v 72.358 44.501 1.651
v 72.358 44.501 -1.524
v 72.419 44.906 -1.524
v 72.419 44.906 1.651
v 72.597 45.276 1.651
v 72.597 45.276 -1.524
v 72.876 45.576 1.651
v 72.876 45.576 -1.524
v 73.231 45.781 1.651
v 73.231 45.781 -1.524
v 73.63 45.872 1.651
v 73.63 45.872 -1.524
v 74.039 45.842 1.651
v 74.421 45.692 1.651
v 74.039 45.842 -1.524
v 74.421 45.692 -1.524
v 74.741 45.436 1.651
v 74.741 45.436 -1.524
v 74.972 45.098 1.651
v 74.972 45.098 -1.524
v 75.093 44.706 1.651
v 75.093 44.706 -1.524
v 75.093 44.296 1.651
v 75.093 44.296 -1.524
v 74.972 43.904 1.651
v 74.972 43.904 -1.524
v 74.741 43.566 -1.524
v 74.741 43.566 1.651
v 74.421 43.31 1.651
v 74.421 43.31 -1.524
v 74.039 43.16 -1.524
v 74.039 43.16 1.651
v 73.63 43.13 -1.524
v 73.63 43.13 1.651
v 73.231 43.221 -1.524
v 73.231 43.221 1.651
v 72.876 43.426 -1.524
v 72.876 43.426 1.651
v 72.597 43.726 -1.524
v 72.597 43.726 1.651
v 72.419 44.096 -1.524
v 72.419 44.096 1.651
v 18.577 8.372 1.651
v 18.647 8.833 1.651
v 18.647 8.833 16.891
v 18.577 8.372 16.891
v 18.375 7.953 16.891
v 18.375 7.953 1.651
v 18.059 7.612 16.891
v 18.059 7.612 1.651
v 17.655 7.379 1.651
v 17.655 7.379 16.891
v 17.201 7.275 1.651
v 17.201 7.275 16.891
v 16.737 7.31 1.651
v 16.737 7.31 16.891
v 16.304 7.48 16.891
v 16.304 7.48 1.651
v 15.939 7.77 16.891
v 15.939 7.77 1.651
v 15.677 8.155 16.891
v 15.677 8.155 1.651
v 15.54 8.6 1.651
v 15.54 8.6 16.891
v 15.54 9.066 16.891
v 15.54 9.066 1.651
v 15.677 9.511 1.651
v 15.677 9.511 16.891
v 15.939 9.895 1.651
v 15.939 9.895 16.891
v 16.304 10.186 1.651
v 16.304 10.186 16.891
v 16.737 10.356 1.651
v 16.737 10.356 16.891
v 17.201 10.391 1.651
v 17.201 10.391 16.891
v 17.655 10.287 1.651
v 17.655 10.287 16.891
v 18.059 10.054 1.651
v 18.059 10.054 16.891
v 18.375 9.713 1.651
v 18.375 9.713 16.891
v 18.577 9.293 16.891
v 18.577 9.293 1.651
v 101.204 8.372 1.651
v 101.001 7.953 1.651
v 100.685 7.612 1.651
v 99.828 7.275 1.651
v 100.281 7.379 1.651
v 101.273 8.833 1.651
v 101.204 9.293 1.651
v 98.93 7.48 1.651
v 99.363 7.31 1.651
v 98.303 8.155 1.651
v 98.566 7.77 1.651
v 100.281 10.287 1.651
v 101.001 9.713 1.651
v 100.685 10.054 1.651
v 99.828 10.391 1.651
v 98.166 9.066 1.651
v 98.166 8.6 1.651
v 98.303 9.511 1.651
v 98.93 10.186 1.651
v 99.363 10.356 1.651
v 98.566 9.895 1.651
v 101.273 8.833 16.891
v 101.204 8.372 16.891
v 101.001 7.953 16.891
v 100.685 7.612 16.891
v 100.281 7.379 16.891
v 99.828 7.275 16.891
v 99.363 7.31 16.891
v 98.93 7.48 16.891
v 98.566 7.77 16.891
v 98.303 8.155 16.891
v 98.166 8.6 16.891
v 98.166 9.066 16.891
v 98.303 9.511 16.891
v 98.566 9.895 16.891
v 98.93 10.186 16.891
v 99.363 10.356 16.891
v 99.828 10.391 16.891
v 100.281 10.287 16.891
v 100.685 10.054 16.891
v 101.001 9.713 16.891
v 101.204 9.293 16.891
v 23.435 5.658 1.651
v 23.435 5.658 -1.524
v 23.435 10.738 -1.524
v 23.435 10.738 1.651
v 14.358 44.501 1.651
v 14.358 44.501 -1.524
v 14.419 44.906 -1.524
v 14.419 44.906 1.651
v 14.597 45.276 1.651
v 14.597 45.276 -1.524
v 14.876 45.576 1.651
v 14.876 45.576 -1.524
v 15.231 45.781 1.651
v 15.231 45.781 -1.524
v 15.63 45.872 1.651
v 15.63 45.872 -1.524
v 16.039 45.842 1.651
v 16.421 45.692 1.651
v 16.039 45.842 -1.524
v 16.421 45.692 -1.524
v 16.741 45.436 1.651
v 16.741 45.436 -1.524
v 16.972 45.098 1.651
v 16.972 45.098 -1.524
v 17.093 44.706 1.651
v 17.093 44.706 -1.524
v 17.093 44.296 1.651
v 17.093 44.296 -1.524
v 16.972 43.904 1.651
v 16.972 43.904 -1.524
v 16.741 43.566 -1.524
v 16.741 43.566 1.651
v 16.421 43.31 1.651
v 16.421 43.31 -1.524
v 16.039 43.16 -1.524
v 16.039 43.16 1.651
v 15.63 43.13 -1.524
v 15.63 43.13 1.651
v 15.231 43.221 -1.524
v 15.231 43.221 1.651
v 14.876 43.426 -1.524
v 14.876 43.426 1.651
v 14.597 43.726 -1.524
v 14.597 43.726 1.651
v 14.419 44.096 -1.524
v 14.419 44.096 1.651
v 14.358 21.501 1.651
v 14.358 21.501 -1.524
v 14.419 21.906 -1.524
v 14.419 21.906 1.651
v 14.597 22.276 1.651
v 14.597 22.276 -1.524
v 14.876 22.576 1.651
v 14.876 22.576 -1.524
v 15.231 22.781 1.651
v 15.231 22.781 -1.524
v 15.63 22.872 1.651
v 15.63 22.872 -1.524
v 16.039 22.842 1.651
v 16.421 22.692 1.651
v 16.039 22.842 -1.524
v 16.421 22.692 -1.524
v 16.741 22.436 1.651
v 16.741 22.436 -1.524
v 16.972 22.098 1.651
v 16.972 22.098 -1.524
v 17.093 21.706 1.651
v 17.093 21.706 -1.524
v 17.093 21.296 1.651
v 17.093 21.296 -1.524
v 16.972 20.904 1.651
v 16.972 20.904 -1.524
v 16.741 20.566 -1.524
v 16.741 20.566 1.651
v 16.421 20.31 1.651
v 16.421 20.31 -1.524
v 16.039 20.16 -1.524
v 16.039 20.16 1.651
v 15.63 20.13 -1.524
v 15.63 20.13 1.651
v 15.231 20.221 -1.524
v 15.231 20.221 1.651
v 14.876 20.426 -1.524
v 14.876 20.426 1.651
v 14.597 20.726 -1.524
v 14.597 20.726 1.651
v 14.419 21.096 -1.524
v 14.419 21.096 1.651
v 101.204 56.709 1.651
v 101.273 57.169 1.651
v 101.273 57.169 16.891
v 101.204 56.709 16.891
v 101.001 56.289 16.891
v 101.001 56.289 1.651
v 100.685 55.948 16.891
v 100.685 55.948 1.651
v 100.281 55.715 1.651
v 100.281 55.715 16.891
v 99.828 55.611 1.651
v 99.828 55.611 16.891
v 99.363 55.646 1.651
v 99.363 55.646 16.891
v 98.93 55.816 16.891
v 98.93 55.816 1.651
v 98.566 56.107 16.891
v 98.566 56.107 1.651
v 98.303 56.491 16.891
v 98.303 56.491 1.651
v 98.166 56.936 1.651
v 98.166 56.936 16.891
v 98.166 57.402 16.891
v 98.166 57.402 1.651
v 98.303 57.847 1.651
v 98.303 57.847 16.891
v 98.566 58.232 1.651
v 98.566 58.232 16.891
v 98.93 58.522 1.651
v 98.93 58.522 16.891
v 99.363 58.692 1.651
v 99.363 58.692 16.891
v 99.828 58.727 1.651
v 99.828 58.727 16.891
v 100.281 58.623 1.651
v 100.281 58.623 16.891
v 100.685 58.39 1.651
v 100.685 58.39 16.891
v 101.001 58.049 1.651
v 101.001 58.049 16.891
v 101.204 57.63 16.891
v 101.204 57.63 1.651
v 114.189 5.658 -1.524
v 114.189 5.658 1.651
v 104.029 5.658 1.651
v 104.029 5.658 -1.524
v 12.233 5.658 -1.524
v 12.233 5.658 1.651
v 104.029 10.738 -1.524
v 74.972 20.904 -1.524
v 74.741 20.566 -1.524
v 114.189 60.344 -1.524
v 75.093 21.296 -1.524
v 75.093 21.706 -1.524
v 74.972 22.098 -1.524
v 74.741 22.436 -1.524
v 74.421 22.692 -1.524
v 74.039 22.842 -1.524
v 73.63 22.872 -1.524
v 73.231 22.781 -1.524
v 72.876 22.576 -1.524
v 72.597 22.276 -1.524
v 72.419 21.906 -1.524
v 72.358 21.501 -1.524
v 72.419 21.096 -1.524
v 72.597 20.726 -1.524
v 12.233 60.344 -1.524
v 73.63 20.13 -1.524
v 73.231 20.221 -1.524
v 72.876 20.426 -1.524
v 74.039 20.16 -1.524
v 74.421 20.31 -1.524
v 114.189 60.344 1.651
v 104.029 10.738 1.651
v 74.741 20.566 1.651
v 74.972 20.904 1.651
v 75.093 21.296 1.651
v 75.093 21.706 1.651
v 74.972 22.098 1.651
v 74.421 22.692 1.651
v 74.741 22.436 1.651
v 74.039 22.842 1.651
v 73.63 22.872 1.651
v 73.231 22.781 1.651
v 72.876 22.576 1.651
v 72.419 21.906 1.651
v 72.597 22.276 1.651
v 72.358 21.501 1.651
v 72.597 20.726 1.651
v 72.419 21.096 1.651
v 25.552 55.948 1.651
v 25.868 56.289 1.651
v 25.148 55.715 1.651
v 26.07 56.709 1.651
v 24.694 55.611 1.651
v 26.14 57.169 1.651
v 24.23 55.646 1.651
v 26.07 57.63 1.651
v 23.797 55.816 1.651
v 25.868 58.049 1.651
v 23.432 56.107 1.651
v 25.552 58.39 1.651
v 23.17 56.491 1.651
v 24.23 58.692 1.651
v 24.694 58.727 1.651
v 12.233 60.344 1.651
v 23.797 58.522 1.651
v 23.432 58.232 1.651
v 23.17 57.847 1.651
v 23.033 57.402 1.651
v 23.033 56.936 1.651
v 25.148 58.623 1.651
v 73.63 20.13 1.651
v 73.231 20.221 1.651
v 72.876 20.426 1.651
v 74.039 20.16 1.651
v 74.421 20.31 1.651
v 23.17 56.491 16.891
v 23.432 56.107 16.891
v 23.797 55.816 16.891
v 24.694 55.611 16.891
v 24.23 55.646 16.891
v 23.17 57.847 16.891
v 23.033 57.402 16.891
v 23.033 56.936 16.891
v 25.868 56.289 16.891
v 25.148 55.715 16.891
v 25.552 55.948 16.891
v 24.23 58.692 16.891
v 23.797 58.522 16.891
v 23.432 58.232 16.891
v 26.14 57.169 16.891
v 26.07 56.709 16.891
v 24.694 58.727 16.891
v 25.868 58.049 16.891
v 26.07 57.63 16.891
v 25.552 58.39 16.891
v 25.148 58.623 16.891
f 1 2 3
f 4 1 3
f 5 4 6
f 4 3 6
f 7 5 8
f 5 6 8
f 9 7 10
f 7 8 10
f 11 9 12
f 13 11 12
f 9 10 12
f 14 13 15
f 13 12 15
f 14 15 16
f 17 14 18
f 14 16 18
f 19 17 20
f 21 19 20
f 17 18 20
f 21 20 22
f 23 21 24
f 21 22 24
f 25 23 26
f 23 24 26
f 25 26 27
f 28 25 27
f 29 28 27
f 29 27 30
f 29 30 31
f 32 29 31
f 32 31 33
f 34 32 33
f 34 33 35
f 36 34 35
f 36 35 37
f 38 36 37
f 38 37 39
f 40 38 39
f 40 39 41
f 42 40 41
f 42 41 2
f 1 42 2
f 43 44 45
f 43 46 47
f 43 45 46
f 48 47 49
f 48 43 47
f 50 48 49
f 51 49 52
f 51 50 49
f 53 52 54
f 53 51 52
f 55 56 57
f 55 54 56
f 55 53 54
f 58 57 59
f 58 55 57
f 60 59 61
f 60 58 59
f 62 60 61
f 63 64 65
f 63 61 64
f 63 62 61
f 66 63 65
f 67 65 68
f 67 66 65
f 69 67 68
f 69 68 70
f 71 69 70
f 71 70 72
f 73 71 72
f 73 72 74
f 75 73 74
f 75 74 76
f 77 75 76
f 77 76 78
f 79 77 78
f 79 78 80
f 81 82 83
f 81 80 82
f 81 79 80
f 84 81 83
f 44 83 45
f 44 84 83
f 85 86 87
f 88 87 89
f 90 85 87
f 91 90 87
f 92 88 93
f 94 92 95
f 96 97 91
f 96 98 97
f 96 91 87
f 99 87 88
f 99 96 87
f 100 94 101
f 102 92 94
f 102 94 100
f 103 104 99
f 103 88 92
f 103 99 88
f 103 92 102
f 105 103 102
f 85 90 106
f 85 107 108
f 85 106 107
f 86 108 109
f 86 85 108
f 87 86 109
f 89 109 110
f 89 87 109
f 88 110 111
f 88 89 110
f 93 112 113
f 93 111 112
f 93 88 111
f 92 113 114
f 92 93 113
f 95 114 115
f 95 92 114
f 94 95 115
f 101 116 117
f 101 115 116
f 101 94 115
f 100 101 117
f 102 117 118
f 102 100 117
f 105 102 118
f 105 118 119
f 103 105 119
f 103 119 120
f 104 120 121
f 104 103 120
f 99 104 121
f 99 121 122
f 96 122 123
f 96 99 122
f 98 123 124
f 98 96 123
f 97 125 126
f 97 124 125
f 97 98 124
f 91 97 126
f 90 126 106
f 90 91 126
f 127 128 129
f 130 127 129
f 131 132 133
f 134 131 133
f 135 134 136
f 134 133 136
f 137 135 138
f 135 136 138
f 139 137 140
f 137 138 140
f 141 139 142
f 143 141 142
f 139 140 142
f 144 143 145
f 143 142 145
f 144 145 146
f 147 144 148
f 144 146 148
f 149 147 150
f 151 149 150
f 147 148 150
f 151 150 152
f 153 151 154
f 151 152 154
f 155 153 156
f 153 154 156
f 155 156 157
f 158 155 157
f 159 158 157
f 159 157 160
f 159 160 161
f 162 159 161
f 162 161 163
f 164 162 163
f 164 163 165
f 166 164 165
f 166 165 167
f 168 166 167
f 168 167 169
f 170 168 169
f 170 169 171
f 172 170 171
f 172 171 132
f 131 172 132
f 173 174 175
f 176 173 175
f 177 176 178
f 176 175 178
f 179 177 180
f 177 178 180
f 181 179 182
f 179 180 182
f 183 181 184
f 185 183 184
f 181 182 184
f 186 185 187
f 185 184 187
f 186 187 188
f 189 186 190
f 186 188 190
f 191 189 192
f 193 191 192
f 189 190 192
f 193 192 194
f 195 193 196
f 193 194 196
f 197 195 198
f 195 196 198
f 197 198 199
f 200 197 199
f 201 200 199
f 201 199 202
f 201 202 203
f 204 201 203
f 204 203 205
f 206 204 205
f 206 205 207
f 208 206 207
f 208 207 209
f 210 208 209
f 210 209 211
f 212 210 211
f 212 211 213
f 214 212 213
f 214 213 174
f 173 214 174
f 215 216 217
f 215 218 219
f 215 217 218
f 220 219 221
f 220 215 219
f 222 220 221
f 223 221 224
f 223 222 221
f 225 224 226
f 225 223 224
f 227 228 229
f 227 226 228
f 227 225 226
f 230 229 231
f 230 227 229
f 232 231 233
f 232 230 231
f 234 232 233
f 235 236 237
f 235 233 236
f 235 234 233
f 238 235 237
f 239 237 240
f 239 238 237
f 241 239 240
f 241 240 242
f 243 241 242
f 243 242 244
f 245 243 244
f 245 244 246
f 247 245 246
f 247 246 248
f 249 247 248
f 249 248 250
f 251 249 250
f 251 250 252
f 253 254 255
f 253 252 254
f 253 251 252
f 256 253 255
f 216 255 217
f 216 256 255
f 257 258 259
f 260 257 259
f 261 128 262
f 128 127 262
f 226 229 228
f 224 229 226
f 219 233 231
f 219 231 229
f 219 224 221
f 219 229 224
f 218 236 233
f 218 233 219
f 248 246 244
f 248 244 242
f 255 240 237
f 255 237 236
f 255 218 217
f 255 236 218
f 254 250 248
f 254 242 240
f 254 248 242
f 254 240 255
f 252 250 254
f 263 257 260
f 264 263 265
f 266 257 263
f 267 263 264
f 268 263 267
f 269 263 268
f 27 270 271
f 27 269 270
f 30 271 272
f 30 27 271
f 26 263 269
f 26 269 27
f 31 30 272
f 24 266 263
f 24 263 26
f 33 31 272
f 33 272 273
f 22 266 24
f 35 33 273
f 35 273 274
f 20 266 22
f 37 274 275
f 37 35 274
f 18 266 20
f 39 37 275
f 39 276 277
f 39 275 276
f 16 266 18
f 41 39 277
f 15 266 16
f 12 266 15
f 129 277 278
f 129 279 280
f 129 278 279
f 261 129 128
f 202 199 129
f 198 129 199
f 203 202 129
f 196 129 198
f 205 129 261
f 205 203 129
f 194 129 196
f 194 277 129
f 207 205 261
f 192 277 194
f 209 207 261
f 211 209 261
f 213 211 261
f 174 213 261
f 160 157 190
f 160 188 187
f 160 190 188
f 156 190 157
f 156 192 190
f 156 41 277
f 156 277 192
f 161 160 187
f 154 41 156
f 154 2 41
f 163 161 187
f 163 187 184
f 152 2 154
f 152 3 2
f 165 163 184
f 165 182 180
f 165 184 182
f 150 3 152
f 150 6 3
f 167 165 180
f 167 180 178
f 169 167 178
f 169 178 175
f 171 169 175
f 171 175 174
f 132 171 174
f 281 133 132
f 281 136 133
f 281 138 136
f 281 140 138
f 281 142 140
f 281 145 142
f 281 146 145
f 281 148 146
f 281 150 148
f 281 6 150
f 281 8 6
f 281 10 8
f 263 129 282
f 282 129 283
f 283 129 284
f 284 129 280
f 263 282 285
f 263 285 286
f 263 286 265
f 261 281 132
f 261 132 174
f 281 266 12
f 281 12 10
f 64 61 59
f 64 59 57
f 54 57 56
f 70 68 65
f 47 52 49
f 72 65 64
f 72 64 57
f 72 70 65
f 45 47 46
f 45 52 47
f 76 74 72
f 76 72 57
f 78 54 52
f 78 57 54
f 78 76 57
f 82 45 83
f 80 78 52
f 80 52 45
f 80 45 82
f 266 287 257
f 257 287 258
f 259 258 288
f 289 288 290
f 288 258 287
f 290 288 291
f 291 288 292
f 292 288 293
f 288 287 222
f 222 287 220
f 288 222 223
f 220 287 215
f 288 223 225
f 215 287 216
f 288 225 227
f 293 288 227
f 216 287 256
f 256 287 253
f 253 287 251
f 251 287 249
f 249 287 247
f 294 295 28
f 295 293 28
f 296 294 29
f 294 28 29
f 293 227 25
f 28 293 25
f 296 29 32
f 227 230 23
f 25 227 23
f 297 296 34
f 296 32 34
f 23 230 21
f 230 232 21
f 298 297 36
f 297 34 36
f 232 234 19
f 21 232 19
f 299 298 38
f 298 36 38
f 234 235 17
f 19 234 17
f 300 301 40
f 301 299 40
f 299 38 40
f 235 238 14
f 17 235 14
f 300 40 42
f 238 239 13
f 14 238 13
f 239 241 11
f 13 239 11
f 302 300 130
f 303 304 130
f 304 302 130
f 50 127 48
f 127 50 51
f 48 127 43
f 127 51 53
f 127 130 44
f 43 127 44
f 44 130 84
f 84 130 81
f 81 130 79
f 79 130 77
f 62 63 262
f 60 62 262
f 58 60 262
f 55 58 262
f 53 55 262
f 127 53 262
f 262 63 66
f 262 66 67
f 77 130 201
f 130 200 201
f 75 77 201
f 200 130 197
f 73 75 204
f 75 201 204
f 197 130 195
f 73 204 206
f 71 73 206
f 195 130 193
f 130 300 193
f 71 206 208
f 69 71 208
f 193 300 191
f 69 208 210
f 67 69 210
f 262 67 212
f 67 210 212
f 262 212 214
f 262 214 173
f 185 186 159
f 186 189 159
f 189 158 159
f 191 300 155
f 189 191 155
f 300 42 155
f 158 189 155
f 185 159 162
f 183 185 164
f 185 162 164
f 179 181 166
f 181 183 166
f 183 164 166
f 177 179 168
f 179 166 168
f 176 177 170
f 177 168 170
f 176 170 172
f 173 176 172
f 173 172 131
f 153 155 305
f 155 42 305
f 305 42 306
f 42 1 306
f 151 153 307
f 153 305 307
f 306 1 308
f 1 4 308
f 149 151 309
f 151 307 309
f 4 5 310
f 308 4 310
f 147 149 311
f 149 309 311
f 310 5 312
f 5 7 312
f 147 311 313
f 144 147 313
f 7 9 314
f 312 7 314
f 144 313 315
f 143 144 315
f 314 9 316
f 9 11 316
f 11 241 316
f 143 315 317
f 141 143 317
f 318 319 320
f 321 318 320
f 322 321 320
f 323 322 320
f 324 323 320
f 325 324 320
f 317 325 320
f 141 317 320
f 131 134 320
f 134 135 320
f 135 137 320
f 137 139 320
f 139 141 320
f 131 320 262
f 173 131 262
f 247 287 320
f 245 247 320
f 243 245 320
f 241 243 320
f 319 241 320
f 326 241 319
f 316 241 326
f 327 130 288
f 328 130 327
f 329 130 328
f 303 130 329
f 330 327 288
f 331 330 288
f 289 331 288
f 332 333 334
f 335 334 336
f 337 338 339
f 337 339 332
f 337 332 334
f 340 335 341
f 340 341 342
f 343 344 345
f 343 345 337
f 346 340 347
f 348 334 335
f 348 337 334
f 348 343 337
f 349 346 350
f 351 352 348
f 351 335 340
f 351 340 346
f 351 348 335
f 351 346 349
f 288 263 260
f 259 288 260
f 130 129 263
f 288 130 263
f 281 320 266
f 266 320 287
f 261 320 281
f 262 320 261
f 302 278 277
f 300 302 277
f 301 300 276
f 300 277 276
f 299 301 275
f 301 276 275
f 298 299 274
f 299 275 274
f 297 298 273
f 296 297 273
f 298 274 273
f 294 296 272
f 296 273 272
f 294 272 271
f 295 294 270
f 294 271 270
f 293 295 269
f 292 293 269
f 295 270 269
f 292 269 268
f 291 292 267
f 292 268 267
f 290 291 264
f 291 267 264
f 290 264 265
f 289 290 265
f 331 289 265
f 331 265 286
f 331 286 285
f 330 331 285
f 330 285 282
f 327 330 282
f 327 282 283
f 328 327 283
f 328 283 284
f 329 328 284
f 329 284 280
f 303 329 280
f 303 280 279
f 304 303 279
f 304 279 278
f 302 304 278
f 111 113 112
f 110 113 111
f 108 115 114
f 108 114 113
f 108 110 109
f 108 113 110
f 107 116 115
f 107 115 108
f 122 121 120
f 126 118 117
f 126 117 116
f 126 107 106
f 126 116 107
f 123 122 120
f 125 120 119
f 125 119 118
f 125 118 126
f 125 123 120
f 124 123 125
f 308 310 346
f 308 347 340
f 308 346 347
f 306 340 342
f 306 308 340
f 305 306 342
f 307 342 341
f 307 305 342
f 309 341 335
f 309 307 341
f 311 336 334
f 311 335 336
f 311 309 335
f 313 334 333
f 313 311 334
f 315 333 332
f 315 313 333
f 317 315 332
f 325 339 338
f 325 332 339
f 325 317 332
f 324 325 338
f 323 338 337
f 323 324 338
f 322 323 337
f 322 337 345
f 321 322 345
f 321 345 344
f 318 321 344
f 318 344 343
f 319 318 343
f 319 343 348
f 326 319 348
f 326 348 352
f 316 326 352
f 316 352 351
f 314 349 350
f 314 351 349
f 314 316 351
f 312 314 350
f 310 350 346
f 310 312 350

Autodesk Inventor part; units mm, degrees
ref_plane "Work Plane10" through (-47.244, -26.7081, 1.651) normal (0, 0, 1) x (1, 0, 0)
sketch "Sketch1" plane through (-47.244, -26.7081, 1.651) normal (0, 0, 1) x (1, 0, 0)
  circle A0 centre (1.2954, 2.54) radius 1.5621 projected
  circle A1 centre (8.7884, 50.8762) radius 1.5621 projected
  circle A2 centre (32.2961, 35.4347) radius 1.3153 projected
  circle A3 centre (32.2961, 7.4185) radius 1.5621 projected
  circle A4 centre (83.9216, 2.54) radius 1.5621 projected
  circle A5 centre (83.9216, 50.8762) radius 1.5621 projected
  line L0 (0, 0) -> (96.52, 0) projected
  line L1 (96.52, 53.4162) -> (0.7474, 53.4162) projected
  line L2 (-3.556, 38.1762) -> (-3.556, 3.556) projected
  line L3 (98.044, 1.524) -> (98.044, 51.8922) projected
  line L4 (98.044, 53.4162) -> (-3.556, 53.4162)
  line L5 (-3.556, 53.4162) -> (-3.556, 0)
  line L6 (-3.556, 0) -> (98.044, 0)
  line L7 (98.044, 0) -> (98.044, 53.4162)
  circle A6 centre (83.9216, 50.8762) radius 1.5621
  circle A7 centre (83.9216, 2.54) radius 1.5621
  circle A8 centre (32.2961, 7.4185) radius 1.5621
  circle A9 centre (32.2961, 35.4347) radius 1.3153
  circle A10 centre (8.7884, 50.8762) radius 1.5621
  circle A11 centre (1.2954, 2.54) radius 1.5621
  point P0 (47.244, 26.7081)
  dimension "d0" = 31.0007
  dimension "d1" = 48.3362
  dimension "d2" = 28.0162
  dimension "d3" = 53.4162
  dimension "d4" = 48.3362
  dimension "d5" = 101.6
  dimension "d6" = 3.1242
  dimension "d7" = 3.1242
  dimension "d8" = 3.1242
  dimension "d9" = 3.1242
  dimension "d10" = 3.1242
  dimension "d11" = 2.6305
  dimension "d12" = 2.54
  dimension "d13" = 12.3444
  dimension "d14" = 2.54
  dimension "d15" = 4.8514
  dimension "d16" = 2.54
  dimension "d17" = 14.1224
  dimension "d18" = 2.54
  dimension "d19" = 14.1224
  dimension "d67" = 101.6
  dimension "d68" = 53.4162
ref_plane "Work Plane2" through (-47.244, -26.7081, 1.651) normal (0, 0, 1) x (1, 0, 0)
sketch "Sketch2" plane through (-47.244, -26.7081, 1.651) normal (0, 0, 1) x (1, 0, 0)
  circle A0 centre (71.8216, 83.8772) radius 1.5621
  circle A1 centre (64.3286, 35.541) radius 1.5621
  circle A2 centre (146.9548, 35.541) radius 1.5621
  circle A3 centre (146.9548, 83.8772) radius 1.5621
  line L0 (115.9668, 75.089) -> (64.3286, 75.089) construction
  line L1 (115.9668, 33.001) -> (64.3286, 33.001) construction
  dimension "d98" = 3.1242
  dimension "d99" = 3.1242
  dimension "d100" = 3.1242
  dimension "d101" = 3.1242
  dimension "d102" = 82.6262
  dimension "d104" = 0
  dimension "d105" = 48.3362
  dimension "d130" = 2.54
  dimension "d131" = 2.54
  dimension "d132" = 75.1332
  dimension "d133" = 48.3362
ref_plane "Work Plane3" through (-14.9479, -19.2896, -20.574) normal (0, 0, -1) x (-1, 0, 0)
sketch "Sketch3" plane through (-14.9479, -19.2896, -20.574) normal (0, 0, -1) x (-1, 0, 0)
  line L0 (12.7, -3.175) -> (-48.4505, -3.175)
  line L1 (-48.4505, 31.1912) -> (12.7, 31.1912)
  line L2 (12.7, 31.1912) -> (12.7, -3.175)
  line L3 (-54.8005, 45.9977) -> (-48.4505, 45.9977)
  line L4 (-48.4505, 45.9977) -> (-48.4505, 31.1912)
  line L5 (-48.4505, -3.175) -> (-48.4505, -7.4185)
  line L6 (-48.4505, -7.4185) -> (-54.8005, -7.4185)
  circle A0 centre (0, 0) radius 1.5621 construction
  circle A1 centre (0, 28.0162) radius 1.3153 construction
  circle A2 centre (-51.6255, 43.4577) radius 1.5621 construction
  circle A3 centre (-51.6255, -4.8785) radius 1.5621 construction
  line L7 (-54.8005, -7.4185) -> (-54.8005, 45.9977)
  line L8 (-64.2239, 45.9977) -> (31.5487, 45.9977) projected
  line L9 (32.2961, -7.4185) -> (-64.2239, -7.4185) projected
  point P0 (-14.9479, 19.2896)
  point P1 (0, 14.0081)
  point P2 (-25.8127, 14.0081)
  dimension "d24" = 28.0162
  dimension "d25" = 14.0081
  dimension "d26" = 17.1831
  dimension "d29" = 51.6255
  dimension "d30" = 25.8128
  dimension "d36" = 3.175
  dimension "d37" = 3.175
  dimension "d38" = 3.175
  dimension "d39" = 0
  dimension "d40" = 0
  dimension "d41" = 3.175
  dimension "d48" = 12.7
extrude "Extrusion3" [suppressed]
ref_plane "Work Plane4" through (-47.244, -26.7081, 1.651) normal (0, 0, 1) x (1, 0, 0)
ref_plane "Work Plane8" through (57.15, 17.5006, -10.795) normal (0, 0, -1) x (-1, 0, 0)
ref_plane "Work Plane9" through (52.6288, -22.8981, 0) normal (1, 0, 0) x (0, 0, -1)
extrude "Extrusion12" add sketch "Sketch2" along normal blind 15.24
sketch "Sketch18" plane through (99.7108, 57.1691, 1.651) normal (0, 0, -1) x (-1, 0, 0)
  line L0 (6.35, 3.175) -> (-14.478, 3.175)
  line L1 (-14.478, 3.175) -> (-14.478, -51.5112)
  line L2 (-14.478, -51.5112) -> (6.35, -51.5112)
  line L3 (6.35, -51.5112) -> (6.35, 3.175)
  circle A0 centre (0, 0) radius 1.5621 construction
  circle A1 centre (0, -48.3362) radius 1.5621 construction
  line L4 (0, 0) -> (0, -48.3362) construction
  line L5 (6.35, 3.175) -> (87.4776, 3.175)
  line L6 (87.4776, 3.175) -> (87.4776, -51.5112)
  line L7 (87.4776, -51.5112) -> (6.35, -51.5112)
  line L8 (6.35, -51.5112) -> (6.35, 3.175)
  circle A2 centre (75.1332, 0) radius 1.5621 construction
  circle A3 centre (82.6262, -48.3362) radius 1.5621 projected
  line L9 (0, -48.3362) -> (82.6262, -48.3362) construction
  point P0 (99.7108, -57.1691)
  point P1 (0, -24.1681)
  point P2 (41.3131, -48.3362)
  dimension "d116" = 20.828
  dimension "d117" = 14.478
  dimension "d120" = 24.1681
  dimension "d121" = 48.3362
  dimension "d122" = 54.6862
  dimension "d123" = 27.3431
  dimension "d124" = 54.6862
  dimension "d126" = 0
  dimension "d127" = 101.9556
  dimension "d137" = 41.3131
  dimension "d138" = 82.6262
  dimension "d139" = 55.7911
  dimension "d140" = 4.8514
extrude "Extrusion13" add sketch "Sketch18" along normal blind 3.175 contours L3 L2 L1 L0 | L5 L6 L7 L3 | A3
sketch "Sketch19" plane through (99.7108, 57.1691, 16.891) normal (0, 0, 1) x (1, 0, 0)
  circle A0 centre (0, 0) radius 1.5621 projected
  circle A1 centre (0, -48.3362) radius 1.5621 projected
  circle A2 centre (-75.1332, 0) radius 1.5621 projected
  circle A3 centre (-82.6262, -48.3362) radius 1.5621 projected
  line L0 (14.478, -51.5112) -> (14.478, 3.175) projected
  point P0 (-99.7108, -57.1691)
  dimension "d134" = 82.6262
  dimension "d135" = 14.478
sketch "Sketch20" plane through (99.7108, 57.1691, -1.524) normal (0, 0, -1) x (-1, 0, 0)
  circle A0 centre (83.9776, -12.6681) radius 1.375
  circle A1 centre (83.9776, -35.6681) radius 1.375
  circle A2 centre (25.9776, -12.6681) radius 1.375
  circle A3 centre (25.9776, -35.6681) radius 1.375
  line L0 (-14.478, 3.175) -> (-14.478, -51.5112) projected
  line L1 (25.9776, -12.6681) -> (25.9776, -35.6681) construction
  line L2 (-14.478, -51.5112) -> (87.4776, -51.5112) projected
  line L3 (87.4776, -51.5112) -> (87.4776, 3.175) projected
  point P0 (99.7108, -57.1691)
  point P1 (25.9776, -24.1681)
  dimension "d141" = 2.75
  dimension "d142" = 2.75
  dimension "d143" = 2.75
  dimension "d144" = 2.75
  dimension "d145" = 23
  dimension "d146" = 23
  dimension "d147" = 58
  dimension "d149" = 11.5
  dimension "d150" = 54.6862
  dimension "d151" = 27.3431
  dimension "d152" = 0
  dimension "d155" = 3.5
  dimension "d156" = 3.5
extrude "Extrusion14" cut sketch "Sketch20" against normal through all
sketch "Sketch21" plane through (99.7108, 57.1691, -1.524) normal (0, 0, -1) x (-1, 0, 0)
  circle A0 centre (0, -48.3362) radius 1.5621 projected
  circle A1 centre (0, -48.3362) radius 1.5621 projected
  circle A2 centre (0, 0) radius 1.5621 projected
  circle A3 centre (0, 0) radius 1.5621 projected
  circle A4 centre (75.1332, 0) radius 1.5621 projected
  circle A5 centre (75.1332, 0) radius 1.5621 projected
  circle A6 centre (82.6262, -48.3362) radius 1.5621 projected
  circle A7 centre (82.6262, -48.3362) radius 1.5621 projected
  line L0 (-14.478, -51.5112) -> (87.4776, -51.5112) projected
  line L1 (-4.318, -51.5112) -> (76.2762, -51.5112)
  line L2 (76.2762, -51.5112) -> (76.2762, -46.4312)
  line L3 (76.2762, -46.4312) -> (-4.318, -46.4312)
  line L4 (-4.318, -46.4312) -> (-4.318, -51.5112)
  line L5 (-14.478, 3.175) -> (-14.478, -51.5112) projected
  point P0 (99.7108, -57.1691)
  dimension "d157" = 6.35
  dimension "d159" = 5.08
  dimension "d162" = 10.16
extrude "Extrusion15" cut sketch "Sketch21" against normal up to surface (3.175 mm away) contours A0 | L4 L3 L2 L0
equation "\"d25\" = 0.5 * d24"
equation "\"d26\" = 0.5 * d22"
equation "\"d30\" = 0.5 * d29"
equation "\"d37\" = d36"
equation "\"d38\" = d41"
equation "\"d99\" = d98"
equation "\"d100\" = d99"
equation "\"d101\" = d98"
equation "\"d120\" = 0.5 * d121"
equation "\"d123\" = 0.5 * d122"
equation "\"d124\" = d122"
equation "\"d137\" = 0.5 * d138"
equation "\"d142\" = d141"
equation "\"d143\" = d141"
equation "\"d144\" = d141"
equation "\"d149\" = 0.5 * d146"
equation "\"d151\" = 0.5 * d150"
equation "\"d74\" = d71"
equation "\"d71\" = 3.175"
equation "\"d22\" = 34.3662"
properties part number "Camera&Pi Holder" material "Aluminum 6061-AHC"
